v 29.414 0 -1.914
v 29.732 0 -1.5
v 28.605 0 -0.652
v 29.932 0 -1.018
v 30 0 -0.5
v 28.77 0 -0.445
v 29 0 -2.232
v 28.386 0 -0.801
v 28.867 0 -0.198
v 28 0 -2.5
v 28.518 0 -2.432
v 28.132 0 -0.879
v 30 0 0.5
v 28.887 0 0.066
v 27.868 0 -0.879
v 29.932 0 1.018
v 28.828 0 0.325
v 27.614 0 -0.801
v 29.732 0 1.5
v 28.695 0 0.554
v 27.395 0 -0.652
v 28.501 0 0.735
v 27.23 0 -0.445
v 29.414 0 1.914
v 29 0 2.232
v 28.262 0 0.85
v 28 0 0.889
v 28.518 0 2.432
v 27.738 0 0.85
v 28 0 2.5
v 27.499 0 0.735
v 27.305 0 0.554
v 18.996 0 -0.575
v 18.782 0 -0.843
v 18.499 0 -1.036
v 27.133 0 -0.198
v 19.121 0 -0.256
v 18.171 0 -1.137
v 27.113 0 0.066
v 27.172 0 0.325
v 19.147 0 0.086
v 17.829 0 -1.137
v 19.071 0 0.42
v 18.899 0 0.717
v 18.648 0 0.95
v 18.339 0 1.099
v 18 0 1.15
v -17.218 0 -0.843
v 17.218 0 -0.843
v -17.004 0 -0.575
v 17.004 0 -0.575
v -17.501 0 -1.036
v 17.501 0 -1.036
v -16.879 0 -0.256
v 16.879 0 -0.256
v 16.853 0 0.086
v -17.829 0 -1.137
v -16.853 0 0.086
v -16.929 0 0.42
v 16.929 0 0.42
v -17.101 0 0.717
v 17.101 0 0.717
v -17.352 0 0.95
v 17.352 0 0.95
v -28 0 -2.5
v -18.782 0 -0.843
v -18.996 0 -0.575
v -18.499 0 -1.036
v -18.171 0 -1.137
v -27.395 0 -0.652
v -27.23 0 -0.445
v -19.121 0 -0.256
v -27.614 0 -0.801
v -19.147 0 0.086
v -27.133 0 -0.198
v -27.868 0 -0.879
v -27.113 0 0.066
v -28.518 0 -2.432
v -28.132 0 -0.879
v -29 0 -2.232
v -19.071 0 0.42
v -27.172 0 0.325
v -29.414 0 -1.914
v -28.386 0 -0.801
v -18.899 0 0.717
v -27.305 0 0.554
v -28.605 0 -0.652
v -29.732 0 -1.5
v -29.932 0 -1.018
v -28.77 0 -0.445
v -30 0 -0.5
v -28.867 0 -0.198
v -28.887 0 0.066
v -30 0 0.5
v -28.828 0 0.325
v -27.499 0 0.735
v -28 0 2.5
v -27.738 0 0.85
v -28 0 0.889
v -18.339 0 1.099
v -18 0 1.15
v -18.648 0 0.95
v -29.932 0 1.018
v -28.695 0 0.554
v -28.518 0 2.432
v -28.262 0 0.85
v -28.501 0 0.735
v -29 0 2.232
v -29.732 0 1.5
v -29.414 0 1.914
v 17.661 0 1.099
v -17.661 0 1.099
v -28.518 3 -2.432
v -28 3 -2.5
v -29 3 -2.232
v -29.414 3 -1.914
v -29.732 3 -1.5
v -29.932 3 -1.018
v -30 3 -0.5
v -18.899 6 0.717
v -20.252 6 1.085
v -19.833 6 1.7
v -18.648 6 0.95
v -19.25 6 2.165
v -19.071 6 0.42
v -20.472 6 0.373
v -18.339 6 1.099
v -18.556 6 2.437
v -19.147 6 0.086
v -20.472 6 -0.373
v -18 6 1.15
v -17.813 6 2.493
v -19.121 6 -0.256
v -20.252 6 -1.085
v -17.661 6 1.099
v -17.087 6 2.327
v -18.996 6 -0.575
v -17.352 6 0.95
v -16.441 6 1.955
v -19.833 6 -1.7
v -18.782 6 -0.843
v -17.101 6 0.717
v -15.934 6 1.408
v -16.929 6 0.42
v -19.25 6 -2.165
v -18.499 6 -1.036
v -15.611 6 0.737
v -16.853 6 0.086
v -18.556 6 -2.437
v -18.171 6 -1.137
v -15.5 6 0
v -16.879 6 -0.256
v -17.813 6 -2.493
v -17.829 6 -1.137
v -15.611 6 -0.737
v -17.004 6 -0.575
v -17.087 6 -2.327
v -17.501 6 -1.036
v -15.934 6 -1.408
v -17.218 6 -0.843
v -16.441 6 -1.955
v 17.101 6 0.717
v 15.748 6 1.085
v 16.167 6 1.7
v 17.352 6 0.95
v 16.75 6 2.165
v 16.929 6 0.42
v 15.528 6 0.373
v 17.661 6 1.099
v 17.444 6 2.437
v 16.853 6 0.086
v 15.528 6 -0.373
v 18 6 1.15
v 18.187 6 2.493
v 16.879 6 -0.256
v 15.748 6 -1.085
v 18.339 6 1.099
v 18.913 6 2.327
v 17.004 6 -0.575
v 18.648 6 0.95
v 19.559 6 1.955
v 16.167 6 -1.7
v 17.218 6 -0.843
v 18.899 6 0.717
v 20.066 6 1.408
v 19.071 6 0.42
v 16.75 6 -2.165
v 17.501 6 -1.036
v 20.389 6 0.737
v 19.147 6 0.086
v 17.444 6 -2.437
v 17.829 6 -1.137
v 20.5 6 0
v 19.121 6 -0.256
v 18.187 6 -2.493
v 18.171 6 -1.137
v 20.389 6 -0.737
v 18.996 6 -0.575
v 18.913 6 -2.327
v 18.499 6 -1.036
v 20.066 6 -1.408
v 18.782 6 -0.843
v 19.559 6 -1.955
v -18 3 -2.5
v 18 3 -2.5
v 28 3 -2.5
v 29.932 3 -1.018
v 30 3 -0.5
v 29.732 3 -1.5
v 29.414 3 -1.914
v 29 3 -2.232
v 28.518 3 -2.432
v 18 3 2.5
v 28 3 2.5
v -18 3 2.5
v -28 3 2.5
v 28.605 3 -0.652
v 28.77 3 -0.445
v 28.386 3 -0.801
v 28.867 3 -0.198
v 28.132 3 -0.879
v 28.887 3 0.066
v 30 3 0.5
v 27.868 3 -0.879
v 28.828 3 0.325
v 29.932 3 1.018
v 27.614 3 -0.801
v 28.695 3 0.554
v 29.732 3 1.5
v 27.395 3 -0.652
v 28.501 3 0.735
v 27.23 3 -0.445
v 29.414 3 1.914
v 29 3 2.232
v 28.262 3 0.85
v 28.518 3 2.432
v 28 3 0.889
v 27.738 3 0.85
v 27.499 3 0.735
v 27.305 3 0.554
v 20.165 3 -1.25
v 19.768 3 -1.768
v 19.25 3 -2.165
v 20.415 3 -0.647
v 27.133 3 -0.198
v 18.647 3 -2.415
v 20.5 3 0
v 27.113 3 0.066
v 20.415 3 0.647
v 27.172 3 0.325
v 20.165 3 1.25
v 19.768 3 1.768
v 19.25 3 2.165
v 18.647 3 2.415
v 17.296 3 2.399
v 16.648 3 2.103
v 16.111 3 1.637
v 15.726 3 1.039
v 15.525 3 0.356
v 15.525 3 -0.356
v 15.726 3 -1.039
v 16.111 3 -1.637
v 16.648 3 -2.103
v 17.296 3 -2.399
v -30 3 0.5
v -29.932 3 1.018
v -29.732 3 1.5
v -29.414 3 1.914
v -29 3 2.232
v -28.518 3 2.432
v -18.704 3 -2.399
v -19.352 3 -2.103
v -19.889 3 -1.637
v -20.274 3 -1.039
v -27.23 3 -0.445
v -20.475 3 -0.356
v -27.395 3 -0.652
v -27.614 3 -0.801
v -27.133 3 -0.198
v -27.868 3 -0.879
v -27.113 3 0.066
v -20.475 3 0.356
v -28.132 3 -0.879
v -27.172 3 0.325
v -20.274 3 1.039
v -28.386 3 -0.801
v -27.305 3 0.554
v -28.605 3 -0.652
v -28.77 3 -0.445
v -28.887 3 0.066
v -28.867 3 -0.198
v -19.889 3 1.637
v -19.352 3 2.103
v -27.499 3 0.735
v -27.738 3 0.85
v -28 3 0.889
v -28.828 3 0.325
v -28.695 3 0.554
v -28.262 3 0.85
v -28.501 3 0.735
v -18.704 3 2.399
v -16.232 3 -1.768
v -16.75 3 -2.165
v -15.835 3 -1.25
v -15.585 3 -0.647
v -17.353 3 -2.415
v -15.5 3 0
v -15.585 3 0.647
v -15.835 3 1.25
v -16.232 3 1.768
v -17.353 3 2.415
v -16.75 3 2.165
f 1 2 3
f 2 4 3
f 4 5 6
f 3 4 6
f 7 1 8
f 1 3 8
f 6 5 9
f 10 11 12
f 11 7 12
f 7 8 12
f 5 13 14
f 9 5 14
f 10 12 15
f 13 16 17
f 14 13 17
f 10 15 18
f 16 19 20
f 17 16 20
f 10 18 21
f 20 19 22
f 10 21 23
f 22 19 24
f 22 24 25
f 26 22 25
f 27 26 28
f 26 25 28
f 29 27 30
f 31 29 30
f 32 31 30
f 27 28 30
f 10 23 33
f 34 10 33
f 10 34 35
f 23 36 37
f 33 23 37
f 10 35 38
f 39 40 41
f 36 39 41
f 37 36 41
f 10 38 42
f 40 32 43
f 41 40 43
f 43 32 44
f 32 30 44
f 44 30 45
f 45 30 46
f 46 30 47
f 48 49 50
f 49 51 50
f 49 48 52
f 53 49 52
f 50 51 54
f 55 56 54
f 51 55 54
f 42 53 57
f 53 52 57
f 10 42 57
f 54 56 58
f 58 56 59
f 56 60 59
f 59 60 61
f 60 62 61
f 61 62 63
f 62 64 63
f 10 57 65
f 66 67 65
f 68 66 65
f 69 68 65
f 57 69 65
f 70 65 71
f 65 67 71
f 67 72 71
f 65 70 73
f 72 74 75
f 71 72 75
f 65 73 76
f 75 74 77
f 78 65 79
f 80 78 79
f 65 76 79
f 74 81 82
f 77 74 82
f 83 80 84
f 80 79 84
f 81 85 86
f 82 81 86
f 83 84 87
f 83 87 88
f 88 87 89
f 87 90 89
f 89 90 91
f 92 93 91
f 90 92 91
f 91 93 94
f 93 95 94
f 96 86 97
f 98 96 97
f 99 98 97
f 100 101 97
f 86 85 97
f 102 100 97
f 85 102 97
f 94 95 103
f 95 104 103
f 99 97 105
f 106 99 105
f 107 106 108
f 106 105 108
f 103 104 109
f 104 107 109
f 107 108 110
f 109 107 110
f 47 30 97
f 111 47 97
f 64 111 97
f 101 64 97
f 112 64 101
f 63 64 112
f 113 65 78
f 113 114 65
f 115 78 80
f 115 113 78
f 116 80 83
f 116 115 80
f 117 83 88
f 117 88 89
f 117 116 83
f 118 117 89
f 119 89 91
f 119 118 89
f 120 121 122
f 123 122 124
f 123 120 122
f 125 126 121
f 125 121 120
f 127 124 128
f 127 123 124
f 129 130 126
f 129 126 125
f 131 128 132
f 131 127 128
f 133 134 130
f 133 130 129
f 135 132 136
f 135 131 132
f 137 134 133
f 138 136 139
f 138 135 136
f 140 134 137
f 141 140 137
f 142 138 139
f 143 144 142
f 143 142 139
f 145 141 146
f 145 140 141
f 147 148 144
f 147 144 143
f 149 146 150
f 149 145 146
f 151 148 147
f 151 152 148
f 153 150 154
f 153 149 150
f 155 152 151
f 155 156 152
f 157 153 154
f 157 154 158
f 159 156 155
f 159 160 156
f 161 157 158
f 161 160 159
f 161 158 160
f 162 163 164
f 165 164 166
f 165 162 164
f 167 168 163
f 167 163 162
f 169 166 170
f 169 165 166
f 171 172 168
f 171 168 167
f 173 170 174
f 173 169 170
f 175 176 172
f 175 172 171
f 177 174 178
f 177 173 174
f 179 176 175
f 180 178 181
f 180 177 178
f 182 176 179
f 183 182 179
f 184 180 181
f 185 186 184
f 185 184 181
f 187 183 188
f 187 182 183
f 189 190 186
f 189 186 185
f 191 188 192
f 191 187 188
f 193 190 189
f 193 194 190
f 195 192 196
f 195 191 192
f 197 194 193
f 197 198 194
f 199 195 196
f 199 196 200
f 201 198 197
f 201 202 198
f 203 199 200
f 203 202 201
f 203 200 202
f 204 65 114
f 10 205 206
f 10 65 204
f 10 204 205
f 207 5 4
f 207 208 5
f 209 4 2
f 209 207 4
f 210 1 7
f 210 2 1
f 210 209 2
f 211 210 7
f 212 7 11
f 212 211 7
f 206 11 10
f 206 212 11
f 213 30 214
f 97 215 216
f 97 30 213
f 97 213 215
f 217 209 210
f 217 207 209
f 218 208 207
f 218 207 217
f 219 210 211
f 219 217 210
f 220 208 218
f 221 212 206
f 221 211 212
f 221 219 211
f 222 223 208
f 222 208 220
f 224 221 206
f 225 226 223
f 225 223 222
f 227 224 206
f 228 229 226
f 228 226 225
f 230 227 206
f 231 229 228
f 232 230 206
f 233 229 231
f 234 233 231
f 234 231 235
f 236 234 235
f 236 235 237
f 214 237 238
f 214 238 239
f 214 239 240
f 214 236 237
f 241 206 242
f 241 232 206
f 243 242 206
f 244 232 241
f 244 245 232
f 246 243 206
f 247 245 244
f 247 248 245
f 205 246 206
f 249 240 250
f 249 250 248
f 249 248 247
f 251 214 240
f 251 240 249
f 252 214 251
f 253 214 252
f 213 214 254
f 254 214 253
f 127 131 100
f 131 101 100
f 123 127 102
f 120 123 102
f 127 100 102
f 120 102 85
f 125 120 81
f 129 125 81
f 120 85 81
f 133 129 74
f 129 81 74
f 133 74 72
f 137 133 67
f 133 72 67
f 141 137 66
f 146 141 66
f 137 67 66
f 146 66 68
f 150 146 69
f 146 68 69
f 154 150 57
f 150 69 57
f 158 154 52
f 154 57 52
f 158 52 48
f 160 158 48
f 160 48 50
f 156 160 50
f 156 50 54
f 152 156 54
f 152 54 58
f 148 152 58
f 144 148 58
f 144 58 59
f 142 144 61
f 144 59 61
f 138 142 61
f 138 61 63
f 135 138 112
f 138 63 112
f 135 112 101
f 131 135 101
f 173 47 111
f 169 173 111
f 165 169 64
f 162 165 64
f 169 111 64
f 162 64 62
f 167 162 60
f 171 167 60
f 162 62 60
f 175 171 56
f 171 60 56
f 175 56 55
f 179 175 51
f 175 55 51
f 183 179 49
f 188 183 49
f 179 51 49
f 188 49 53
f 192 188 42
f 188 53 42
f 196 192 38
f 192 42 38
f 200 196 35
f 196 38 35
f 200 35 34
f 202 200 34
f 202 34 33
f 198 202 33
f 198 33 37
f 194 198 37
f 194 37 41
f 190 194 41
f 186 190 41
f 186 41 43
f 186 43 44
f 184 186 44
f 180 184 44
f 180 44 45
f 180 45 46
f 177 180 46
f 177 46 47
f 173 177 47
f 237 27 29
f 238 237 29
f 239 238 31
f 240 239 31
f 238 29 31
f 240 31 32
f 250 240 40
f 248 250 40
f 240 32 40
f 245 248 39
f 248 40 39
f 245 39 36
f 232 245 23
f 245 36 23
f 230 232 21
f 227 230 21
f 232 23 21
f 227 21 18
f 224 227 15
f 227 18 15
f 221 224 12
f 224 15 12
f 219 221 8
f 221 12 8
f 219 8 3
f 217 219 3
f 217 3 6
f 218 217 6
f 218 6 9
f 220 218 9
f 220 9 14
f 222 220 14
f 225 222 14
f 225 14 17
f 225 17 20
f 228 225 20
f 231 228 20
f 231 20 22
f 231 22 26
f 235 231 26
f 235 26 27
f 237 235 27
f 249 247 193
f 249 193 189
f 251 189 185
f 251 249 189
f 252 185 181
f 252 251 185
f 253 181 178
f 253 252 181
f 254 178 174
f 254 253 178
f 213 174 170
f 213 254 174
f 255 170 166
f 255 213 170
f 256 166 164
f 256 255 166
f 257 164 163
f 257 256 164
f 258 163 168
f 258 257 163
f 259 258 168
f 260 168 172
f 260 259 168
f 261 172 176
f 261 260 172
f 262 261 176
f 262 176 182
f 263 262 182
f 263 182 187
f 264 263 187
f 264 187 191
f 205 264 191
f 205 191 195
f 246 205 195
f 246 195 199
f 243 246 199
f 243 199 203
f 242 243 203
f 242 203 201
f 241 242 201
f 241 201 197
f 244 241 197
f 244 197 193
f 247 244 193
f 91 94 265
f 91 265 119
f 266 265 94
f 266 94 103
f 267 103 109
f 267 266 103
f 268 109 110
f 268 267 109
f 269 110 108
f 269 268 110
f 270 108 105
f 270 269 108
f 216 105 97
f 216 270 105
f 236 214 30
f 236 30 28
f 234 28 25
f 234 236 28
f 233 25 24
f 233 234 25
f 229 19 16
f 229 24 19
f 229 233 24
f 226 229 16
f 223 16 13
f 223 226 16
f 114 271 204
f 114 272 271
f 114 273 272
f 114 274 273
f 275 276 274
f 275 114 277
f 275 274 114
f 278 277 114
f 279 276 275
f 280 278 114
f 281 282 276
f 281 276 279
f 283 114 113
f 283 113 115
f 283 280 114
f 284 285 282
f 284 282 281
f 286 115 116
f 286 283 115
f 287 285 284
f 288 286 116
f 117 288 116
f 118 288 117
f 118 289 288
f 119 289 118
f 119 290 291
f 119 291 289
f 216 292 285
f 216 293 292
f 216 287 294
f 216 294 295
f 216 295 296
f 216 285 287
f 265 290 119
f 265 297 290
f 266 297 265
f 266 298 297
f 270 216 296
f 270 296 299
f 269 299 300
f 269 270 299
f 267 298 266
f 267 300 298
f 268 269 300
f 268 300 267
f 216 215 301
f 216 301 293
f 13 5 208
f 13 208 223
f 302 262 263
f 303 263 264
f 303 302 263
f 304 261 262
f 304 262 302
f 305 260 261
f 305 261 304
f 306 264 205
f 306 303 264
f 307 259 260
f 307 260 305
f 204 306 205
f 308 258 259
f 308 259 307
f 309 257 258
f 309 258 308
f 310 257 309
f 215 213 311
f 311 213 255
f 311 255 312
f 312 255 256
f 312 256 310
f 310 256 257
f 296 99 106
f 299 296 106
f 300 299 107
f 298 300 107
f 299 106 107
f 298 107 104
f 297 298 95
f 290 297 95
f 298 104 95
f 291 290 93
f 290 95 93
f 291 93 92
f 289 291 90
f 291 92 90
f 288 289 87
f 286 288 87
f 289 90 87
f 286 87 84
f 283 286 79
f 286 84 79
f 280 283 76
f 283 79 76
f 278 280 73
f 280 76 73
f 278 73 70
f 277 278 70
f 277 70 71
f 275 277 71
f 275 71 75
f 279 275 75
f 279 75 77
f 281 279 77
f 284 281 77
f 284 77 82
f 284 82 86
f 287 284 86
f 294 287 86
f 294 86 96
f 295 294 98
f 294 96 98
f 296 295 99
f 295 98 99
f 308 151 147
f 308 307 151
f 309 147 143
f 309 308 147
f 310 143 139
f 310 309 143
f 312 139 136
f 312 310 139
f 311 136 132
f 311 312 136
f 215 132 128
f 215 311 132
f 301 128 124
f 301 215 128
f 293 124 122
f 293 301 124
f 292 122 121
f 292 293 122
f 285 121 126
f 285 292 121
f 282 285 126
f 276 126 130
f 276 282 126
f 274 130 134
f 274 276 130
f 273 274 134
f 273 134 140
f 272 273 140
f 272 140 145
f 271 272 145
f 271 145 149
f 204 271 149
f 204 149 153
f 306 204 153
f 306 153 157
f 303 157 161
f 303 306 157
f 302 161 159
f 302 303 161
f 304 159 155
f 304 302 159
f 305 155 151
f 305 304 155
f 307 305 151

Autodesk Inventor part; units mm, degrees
ref_plane "YZ Plane" through (0, 0, 0) normal (1, 0, 0) x (0, 1, 0)
ref_plane "XZ Plane" through (0, 0, 0) normal (0, 1, 0) x (-1, 0, 0)
ref_plane "XY Plane" through (0, 0, 0) normal (0, 0, 1) x (1, 0, 0)
sketch "Sketch1" plane through (0, 0, 0) normal (0, 1, 0) x (-1, 0, 0)
  line L0 (30, -2.5) -> (-30, -2.5)
  line L1 (-30, -2.5) -> (-30, 2.5)
  line L2 (-30, 2.5) -> (30, 2.5)
  line L3 (30, 2.5) -> (30, -2.5)
  line L4 (30, -2.5) -> (-30, 2.5) construction
  line L5 (-30, -2.5) -> (30, 2.5) construction
  point P0 (0, 0)
  dimension "d0" = 60
  dimension "d1" = 5
extrude "Extrusion1" add sketch "Sketch1" along normal blind 3
sketch "Sketch2" plane through (0, 3, 0) normal (0, 1, 0) x (1, 0, 0)
  line L0 (-30, -2.5) -> (30, -2.5) projected
  line L1 (30, -2.5) -> (30, 2.5) projected
  line L2 (30, 2.5) -> (-30, 2.5) projected
  line L3 (-30, 2.5) -> (-30, -2.5) projected
  line L4 (-30, 2.5) -> (30, -2.5) construction
  line L5 (30, 2.5) -> (-30, -2.5) construction
  line L6 (-30, 0) -> (30, 0) construction
  line L7 (0, 2.5) -> (0, -2.5) construction
  circle A0 centre (-18, 0) radius 2.5
  circle A1 centre (18, 0) radius 2.5
  point P0 (0, 0)
  dimension "d4" = 5
  dimension "d5" = 18
extrude "Extrusion2" add sketch "Sketch2" along normal blind 3 contours A0 | A1
sketch "Sketch3" plane through (-18, 6, 0) normal (0, 1, 0) x (1, 0, 0)
  circle A0 centre (0, 0) radius 2.5 projected
  circle A1 centre (36, 0) radius 2.5 projected
  point P0 (18, 0)
hole "Hole1" at (-18, 6, 0) at (18, 6, 0) direction (0, -1, 0) diameter 2.3 end through all
fillet "Fillet1" radius 2 4 edges at (-30, 1.5, -2.5) (-30, 1.5, 2.5) (30, 1.5, -2.5) (30, 1.5, 2.5)
sketch "Sketch4" plane through (0, 3, 0) normal (0, 1, 0) x (1, 0, 0)
  arc A0 (28, -2.5) -> (30, -0.5) centre (28, -0.5) ccw projected
  line L0 (30, -0.5) -> (30, 0.5) projected
  arc A1 (30, 0.5) -> (28, 2.5) centre (28, 0.5) ccw projected
  line L1 (28, 2.5) -> (18, 2.5) projected
  arc A2 (-28, 2.5) -> (-30, 0.5) centre (-28, 0.5) ccw projected
  line L2 (-30, 0.5) -> (-30, -0.5) projected
  arc A3 (-30, -0.5) -> (-28, -2.5) centre (-28, -0.5) ccw projected
  line L3 (-28, -2.5) -> (-18, -2.5) projected
  arc A4 (18, -2.5) -> (18, 2.5) centre (18, 0) ccw projected
  arc A5 (-18, -2.5) -> (-18, 2.5) centre (-18, 0) ccw projected
  line L4 (-30, 0) -> (30, 0) construction
  line L5 (-28, 0.5) -> (-28, -0.5) construction
  line L6 (28, 0.5) -> (28, -0.5) construction
  arc A6 (18, 2.5) -> (18, -2.5) centre (18, 0) ccw projected
  line L7 (18, 2.5) -> (-18, 2.5) projected
  line L8 (-18, -2.5) -> (18, -2.5) projected
  arc A7 (-18, 2.5) -> (-18, -2.5) centre (-18, 0) ccw projected
  line L9 (-18, 2.5) -> (-28, 2.5) projected
  line L10 (18, -2.5) -> (28, -2.5) projected
  point P0 (0, 0)
  point P1 (-28, 0)
  point P2 (28, 0)
hole "Hole2" at (-28, 3, 0) at (28, 3, 0) direction (0, -1, 0) diameter 1.778 end through all
properties part number "Busbar Base"
